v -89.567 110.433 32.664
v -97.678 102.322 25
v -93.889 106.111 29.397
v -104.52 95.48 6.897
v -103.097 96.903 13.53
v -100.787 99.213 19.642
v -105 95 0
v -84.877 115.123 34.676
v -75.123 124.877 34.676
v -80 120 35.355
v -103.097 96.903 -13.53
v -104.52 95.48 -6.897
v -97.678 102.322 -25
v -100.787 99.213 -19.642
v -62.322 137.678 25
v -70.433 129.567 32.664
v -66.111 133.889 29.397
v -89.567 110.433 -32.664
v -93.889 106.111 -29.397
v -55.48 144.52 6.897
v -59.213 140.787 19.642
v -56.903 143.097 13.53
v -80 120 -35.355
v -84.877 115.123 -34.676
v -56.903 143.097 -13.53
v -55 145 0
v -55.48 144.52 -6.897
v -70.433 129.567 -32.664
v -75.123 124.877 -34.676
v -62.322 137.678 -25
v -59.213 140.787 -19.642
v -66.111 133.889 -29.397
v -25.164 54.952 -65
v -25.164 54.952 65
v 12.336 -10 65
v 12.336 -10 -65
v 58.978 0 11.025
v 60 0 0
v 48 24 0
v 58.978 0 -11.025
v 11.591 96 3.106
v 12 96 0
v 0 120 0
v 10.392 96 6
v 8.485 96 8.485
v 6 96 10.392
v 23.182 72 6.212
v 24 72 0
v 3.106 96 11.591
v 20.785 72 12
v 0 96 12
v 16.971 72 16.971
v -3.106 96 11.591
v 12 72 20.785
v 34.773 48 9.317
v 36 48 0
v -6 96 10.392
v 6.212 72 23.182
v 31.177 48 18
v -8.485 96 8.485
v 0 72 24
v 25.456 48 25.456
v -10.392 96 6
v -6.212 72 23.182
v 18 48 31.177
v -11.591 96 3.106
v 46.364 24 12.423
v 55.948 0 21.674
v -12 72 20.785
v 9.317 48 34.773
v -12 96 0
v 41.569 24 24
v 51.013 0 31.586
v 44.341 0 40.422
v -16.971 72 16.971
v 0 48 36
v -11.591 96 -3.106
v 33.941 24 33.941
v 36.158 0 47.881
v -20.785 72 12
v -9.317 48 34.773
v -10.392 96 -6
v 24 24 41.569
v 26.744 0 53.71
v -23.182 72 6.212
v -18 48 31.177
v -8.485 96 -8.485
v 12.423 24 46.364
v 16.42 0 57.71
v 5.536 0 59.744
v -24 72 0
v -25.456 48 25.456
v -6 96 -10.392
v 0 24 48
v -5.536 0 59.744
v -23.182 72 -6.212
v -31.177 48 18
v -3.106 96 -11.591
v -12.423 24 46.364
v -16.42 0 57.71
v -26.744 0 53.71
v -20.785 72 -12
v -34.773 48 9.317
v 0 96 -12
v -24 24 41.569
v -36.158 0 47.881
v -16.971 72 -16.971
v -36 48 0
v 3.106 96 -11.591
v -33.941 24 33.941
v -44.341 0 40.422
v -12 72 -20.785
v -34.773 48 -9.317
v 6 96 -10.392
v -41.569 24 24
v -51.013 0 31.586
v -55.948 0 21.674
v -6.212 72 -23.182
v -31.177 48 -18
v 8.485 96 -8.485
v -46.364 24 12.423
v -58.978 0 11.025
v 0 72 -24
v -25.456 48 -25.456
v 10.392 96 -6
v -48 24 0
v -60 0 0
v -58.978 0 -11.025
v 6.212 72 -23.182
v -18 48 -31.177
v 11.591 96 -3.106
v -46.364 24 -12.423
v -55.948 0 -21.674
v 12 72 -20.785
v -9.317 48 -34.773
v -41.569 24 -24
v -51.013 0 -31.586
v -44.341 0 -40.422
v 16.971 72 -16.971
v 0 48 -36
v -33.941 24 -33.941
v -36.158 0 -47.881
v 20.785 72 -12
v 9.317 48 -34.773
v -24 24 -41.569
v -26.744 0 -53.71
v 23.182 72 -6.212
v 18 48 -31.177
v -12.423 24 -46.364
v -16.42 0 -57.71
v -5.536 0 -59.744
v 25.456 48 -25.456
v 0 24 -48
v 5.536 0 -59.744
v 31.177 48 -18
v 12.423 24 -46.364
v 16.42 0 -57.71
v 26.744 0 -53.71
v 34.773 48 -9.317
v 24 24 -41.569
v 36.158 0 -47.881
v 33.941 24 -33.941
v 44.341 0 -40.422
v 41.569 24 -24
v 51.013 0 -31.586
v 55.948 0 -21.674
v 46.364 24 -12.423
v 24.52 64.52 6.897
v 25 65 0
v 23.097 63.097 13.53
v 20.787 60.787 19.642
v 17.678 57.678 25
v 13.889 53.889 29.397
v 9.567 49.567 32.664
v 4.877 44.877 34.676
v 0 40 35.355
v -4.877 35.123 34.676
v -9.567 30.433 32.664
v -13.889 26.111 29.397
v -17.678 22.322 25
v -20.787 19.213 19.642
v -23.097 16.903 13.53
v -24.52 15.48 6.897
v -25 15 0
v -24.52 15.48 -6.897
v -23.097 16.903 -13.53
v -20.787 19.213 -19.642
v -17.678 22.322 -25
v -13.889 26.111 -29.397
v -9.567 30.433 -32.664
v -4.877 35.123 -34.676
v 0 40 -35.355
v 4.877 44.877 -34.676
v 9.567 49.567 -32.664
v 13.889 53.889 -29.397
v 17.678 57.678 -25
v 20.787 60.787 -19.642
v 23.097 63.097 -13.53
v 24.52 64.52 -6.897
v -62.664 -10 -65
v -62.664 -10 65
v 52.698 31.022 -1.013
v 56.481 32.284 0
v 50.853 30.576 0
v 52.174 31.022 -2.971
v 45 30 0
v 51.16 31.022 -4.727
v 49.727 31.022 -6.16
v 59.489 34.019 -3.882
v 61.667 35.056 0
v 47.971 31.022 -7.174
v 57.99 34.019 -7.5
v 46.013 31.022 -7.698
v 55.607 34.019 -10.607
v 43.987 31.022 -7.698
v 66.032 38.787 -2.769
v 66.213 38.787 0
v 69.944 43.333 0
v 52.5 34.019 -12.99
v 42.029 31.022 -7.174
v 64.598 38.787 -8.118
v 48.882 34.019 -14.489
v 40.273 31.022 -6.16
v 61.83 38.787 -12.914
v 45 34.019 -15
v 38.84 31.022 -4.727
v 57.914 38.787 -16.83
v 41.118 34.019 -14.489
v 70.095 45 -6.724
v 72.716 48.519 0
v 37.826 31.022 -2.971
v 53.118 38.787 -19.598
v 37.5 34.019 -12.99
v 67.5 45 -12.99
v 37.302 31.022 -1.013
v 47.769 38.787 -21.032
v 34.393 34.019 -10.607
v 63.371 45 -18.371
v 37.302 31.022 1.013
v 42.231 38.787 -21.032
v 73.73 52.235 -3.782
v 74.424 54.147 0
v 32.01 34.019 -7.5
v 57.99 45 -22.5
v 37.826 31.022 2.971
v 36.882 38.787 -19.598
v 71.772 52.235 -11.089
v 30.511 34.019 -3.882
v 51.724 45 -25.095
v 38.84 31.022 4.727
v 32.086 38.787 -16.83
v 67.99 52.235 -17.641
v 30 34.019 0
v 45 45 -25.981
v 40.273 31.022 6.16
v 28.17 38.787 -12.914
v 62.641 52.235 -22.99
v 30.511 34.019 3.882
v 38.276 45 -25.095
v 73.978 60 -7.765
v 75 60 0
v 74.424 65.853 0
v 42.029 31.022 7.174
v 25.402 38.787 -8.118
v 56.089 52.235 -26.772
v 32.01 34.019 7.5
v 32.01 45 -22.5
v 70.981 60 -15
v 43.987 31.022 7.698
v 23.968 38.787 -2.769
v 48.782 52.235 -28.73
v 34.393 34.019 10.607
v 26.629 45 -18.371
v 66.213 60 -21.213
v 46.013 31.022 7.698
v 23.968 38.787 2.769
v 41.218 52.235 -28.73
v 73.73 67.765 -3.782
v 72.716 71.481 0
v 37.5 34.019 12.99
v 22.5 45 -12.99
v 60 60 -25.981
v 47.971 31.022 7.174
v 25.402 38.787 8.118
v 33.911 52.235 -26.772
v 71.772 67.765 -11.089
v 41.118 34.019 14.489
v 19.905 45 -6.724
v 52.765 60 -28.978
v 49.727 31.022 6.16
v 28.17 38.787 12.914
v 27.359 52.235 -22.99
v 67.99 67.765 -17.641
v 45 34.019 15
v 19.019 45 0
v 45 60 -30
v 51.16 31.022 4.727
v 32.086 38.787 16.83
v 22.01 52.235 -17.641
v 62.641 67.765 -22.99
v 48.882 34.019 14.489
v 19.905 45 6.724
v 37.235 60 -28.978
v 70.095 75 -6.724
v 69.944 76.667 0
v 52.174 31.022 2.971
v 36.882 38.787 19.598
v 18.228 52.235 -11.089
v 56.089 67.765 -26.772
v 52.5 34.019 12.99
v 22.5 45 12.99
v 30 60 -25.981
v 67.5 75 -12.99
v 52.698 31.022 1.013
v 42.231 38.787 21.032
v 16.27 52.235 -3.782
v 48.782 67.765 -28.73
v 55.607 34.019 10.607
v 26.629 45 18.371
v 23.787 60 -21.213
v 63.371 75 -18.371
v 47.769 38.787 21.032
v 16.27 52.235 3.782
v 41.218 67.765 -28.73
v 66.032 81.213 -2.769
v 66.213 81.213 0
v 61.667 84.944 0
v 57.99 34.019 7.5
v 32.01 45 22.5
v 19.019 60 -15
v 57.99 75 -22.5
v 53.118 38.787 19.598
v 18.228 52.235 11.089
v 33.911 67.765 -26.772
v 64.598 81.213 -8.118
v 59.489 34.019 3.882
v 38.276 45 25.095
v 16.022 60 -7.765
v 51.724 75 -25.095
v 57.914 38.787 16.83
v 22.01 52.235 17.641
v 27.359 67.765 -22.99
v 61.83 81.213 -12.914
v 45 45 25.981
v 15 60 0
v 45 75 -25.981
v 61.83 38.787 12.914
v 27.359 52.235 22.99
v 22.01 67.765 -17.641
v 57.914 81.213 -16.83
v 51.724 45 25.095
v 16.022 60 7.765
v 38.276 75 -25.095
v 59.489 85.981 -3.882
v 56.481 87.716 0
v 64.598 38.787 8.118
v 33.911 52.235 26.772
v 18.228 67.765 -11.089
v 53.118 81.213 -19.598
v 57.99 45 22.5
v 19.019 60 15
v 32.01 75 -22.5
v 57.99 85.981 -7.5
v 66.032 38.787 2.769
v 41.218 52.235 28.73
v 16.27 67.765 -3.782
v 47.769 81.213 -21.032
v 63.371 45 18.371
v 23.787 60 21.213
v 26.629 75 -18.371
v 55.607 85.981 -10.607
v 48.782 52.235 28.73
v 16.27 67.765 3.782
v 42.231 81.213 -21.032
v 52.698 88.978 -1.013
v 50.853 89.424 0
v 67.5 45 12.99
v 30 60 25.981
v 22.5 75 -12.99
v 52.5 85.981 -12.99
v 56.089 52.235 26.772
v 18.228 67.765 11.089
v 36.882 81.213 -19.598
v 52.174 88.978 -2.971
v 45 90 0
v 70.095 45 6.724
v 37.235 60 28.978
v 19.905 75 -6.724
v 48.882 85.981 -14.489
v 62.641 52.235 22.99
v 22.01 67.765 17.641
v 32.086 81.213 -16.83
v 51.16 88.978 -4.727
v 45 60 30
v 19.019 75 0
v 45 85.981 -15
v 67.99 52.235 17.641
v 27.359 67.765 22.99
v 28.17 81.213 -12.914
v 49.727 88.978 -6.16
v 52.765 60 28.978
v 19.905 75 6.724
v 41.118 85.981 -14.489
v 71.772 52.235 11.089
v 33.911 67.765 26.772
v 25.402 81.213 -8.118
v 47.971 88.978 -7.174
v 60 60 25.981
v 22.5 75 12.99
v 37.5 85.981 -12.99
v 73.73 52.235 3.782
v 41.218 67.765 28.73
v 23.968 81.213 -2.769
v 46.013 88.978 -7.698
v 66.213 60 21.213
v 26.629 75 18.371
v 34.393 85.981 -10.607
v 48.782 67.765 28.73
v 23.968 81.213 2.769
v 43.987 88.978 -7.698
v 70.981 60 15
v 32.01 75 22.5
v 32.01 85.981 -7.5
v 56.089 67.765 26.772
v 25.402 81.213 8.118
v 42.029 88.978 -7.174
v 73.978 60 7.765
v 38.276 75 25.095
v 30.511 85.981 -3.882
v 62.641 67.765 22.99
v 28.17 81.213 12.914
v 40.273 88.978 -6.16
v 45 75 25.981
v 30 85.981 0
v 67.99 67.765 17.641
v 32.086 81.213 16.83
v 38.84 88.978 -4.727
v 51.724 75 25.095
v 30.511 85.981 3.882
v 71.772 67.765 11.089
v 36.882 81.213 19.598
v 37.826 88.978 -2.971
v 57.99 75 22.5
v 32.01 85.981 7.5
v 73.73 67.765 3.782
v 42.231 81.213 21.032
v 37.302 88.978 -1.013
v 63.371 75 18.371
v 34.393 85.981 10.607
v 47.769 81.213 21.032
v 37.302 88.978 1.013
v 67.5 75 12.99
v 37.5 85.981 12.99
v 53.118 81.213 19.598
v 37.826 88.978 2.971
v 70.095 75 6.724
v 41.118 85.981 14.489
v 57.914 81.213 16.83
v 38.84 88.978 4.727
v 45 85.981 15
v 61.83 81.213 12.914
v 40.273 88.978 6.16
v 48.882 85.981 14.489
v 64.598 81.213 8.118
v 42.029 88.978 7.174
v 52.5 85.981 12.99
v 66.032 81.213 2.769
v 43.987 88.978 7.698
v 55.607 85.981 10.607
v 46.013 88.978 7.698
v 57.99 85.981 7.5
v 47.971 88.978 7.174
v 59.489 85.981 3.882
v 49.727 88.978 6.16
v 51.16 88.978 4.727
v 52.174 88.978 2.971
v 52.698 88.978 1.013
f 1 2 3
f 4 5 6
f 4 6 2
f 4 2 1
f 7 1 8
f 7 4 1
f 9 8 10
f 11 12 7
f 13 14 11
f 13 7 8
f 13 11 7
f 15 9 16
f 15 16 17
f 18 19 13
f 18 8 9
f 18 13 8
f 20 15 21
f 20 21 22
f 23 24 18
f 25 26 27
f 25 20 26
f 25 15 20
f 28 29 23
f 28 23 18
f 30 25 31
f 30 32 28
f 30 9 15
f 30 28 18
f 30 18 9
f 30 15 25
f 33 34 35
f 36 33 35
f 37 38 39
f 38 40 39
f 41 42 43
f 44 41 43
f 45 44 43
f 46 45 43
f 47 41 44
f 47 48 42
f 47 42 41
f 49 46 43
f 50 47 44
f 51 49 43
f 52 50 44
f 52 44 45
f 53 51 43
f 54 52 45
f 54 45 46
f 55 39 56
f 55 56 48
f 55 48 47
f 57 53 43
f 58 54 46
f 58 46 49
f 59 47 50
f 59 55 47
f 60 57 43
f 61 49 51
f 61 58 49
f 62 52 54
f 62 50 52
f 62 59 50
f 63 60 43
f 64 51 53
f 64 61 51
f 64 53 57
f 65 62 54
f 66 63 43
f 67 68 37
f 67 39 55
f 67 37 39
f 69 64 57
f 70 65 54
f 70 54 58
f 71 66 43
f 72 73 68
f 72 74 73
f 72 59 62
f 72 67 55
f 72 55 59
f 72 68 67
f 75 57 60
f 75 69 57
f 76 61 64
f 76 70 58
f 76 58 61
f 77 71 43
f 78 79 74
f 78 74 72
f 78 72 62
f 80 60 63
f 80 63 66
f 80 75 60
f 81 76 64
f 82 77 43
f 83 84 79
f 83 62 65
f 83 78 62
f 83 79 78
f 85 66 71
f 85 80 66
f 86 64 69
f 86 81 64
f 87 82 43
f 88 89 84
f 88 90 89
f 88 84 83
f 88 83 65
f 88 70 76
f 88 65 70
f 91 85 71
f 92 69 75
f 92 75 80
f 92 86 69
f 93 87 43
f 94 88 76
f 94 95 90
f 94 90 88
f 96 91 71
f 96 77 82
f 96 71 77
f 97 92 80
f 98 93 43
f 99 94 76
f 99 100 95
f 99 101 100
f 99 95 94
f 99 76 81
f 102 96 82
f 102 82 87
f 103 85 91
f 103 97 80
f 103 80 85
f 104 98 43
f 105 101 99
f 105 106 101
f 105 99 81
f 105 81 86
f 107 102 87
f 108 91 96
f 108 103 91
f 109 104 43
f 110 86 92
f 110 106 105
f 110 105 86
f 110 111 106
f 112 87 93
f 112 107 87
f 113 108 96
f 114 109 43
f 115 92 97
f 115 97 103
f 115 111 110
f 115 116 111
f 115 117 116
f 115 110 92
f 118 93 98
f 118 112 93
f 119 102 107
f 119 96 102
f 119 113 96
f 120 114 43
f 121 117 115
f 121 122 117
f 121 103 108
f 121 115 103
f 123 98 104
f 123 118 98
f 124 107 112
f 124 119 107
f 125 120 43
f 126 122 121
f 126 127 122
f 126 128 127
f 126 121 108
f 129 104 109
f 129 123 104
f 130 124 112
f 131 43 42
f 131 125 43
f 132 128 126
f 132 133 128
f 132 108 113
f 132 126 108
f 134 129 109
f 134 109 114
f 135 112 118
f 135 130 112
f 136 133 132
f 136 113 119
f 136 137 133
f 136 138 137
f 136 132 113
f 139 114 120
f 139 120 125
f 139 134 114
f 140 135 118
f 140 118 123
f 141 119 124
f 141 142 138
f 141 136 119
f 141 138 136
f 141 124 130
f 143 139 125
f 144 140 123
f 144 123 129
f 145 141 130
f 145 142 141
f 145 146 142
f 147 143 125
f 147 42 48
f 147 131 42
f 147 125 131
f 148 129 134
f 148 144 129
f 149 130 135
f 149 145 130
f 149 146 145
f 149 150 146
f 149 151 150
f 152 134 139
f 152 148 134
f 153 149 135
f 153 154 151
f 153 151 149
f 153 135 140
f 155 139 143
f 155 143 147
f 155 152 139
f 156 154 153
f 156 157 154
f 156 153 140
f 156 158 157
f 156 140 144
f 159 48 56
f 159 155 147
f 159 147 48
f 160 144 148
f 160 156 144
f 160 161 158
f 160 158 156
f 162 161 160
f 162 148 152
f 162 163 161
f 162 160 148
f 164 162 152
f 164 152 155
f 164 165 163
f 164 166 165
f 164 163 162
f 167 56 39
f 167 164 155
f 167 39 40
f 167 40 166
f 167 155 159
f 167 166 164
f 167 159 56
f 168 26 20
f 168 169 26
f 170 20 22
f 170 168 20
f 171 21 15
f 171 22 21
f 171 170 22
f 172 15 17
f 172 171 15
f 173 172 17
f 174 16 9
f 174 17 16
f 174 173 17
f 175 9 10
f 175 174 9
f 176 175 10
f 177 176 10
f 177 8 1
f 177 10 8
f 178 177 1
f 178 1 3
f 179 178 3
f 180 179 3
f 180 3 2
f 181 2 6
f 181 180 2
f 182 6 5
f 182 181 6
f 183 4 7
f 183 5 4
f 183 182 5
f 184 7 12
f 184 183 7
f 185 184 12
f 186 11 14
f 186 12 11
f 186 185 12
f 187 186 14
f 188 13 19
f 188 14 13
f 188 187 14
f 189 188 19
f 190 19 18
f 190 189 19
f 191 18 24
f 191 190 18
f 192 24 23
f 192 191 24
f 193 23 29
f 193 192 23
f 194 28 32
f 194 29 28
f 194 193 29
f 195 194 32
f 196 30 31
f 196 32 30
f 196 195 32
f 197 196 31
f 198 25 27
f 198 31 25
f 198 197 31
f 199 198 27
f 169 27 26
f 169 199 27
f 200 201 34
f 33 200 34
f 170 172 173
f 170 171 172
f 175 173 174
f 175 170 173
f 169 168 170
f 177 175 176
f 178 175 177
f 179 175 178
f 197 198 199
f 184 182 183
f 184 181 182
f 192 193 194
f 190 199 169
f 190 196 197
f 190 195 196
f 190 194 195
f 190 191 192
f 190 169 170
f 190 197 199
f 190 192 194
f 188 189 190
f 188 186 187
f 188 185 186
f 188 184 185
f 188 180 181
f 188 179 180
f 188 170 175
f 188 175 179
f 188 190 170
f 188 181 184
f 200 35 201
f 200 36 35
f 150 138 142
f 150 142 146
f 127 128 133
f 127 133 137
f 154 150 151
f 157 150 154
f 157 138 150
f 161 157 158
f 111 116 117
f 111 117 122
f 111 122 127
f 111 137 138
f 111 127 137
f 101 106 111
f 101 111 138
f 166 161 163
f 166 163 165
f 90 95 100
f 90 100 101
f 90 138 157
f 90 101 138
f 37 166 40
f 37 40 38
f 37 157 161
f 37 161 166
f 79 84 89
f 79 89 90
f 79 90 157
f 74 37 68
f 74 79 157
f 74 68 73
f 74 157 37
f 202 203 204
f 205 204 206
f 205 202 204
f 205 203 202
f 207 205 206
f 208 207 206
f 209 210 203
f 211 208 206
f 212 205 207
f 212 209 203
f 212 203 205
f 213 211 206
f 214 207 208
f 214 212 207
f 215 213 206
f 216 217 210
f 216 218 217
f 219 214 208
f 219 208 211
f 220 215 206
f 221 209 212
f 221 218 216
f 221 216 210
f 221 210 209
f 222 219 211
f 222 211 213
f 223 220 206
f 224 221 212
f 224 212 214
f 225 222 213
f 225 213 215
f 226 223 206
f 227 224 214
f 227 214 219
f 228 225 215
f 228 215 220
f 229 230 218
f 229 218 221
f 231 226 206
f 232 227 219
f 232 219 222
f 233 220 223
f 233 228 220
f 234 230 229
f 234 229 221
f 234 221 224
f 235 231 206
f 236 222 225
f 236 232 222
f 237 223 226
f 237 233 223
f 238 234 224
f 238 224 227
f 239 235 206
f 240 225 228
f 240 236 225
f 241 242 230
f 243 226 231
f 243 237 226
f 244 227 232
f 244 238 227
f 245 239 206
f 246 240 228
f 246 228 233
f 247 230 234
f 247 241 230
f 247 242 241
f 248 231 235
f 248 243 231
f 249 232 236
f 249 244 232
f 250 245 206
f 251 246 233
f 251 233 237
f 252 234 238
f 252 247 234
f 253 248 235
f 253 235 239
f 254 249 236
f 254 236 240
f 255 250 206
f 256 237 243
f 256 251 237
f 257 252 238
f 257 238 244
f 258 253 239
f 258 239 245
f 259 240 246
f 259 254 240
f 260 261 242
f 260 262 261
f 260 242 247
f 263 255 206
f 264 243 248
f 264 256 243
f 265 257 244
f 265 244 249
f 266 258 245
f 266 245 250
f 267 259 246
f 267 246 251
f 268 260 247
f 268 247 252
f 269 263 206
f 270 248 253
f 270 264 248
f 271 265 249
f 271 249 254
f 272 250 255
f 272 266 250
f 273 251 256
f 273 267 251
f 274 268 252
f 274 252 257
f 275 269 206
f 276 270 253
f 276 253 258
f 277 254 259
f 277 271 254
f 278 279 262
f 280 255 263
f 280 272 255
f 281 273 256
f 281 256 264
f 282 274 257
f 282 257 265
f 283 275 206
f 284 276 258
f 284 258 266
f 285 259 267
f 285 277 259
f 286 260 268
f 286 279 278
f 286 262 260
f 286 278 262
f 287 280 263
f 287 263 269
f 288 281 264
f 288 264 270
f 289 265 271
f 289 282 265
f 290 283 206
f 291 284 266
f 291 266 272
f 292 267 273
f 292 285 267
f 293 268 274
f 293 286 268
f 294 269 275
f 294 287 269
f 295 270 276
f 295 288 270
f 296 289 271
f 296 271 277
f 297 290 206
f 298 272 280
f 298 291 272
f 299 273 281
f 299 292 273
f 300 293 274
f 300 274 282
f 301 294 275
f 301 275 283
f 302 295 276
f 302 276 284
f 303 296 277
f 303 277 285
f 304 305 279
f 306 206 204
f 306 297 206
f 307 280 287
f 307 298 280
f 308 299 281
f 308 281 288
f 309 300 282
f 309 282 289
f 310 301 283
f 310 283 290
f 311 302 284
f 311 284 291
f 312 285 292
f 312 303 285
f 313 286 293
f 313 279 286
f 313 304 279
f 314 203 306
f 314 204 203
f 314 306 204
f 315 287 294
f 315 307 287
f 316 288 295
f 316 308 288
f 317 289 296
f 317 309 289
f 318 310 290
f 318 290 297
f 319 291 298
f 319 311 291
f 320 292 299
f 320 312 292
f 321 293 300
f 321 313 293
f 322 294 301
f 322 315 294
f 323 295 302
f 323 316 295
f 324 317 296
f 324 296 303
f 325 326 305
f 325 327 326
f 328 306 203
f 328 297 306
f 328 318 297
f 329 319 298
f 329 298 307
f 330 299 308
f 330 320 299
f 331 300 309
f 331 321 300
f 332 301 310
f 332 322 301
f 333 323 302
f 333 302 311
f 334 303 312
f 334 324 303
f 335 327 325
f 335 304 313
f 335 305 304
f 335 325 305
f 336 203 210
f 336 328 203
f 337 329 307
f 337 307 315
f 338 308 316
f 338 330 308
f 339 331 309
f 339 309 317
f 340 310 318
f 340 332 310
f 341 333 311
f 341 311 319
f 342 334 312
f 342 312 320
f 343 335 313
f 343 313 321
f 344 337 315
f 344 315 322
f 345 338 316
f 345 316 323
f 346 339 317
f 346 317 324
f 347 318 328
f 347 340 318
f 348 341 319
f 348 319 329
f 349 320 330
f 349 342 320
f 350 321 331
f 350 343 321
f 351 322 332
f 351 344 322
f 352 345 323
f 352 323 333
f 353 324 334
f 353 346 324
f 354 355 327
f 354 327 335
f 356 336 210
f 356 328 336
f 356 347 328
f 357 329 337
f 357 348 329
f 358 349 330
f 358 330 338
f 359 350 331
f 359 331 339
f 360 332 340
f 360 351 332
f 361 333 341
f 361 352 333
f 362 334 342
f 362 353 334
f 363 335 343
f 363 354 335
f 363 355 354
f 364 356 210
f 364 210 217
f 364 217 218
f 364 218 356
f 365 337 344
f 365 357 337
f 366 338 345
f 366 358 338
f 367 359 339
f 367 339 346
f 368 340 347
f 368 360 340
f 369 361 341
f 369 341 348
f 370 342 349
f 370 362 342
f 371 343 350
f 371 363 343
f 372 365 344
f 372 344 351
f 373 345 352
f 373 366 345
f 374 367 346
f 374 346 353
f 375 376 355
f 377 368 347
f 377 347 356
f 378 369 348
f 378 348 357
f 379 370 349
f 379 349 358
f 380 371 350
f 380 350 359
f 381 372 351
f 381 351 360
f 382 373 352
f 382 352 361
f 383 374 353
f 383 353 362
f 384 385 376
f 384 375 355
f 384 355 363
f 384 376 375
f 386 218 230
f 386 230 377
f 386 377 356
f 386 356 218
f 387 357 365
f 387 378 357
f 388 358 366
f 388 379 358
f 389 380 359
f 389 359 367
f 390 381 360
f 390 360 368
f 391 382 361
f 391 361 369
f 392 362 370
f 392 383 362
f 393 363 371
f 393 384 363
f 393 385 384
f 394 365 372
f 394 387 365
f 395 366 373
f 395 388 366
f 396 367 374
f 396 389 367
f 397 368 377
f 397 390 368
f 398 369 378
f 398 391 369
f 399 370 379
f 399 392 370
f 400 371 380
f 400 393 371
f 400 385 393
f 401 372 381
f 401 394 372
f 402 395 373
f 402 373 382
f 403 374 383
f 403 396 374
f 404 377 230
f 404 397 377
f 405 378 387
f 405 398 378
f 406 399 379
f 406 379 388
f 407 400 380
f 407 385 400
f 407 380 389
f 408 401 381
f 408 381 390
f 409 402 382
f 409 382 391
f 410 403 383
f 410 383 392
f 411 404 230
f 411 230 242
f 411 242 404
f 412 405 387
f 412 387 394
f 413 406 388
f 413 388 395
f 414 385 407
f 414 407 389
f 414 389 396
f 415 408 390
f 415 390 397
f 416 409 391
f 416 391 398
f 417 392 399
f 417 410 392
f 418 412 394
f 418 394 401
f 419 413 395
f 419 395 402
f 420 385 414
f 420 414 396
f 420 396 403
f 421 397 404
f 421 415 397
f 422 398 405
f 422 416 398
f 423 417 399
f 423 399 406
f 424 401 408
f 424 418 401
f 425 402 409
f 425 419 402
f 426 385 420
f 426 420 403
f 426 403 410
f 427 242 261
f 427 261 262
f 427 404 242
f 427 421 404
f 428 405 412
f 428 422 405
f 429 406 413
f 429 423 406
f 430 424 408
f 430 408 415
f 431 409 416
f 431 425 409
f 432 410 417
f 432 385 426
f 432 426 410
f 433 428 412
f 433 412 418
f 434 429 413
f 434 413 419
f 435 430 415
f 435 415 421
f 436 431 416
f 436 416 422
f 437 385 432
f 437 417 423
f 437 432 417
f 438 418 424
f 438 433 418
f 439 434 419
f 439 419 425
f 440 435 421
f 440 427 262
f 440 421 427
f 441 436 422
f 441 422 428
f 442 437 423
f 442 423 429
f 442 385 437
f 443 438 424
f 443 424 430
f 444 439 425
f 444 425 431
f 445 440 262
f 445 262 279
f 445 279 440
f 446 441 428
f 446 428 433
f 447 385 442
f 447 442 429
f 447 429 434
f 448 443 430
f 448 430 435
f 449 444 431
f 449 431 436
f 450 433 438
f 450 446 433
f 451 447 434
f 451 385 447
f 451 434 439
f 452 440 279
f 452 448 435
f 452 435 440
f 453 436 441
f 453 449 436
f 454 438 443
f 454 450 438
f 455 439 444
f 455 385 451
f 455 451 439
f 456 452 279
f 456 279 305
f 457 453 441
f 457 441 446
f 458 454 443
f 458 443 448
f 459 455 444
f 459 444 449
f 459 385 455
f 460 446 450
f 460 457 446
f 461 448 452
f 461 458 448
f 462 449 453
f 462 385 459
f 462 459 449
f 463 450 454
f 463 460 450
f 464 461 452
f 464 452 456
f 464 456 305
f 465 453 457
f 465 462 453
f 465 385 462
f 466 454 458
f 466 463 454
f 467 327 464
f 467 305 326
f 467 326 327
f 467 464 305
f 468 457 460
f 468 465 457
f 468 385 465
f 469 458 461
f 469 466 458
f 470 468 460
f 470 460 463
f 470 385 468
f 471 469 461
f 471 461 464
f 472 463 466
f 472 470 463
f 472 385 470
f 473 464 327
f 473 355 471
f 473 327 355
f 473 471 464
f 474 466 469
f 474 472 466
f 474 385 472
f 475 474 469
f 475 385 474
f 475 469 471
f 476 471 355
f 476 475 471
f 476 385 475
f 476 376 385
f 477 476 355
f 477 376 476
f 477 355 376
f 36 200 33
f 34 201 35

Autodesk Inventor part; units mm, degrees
ref_plane "YZ Plane" through (0, 0, 0) normal (1, 0, 0) x (0, 1, 0)
ref_plane "XZ Plane" through (0, 0, 0) normal (0, 1, 0) x (-1, 0, 0)
ref_plane "XY Plane" through (0, 0, 0) normal (0, 0, 1) x (1, 0, 0)
sketch "Эскиз1" plane through (0, 0, 0) normal (0, 0, 1) x (1, 0, 0)
  line L0 (0, 0) -> (60, 0)
  line L1 (60, 0) -> (0, 120)
  line L2 (0, 120) -> (0, 0)
  dimension "d0" = 60
  dimension "d1" = 120
revolve "Вращение1" add sketch "Эскиз1" angle 360 about axis through (0, 120, 0) along (0, -1, 0)
sketch "Эскиз2" plane through (0, 0, 0) normal (0, 0, 1) x (1, 0, 0)
  line L0 (-60, 0) -> (60, 0) projected
  line L1 (0, 120) -> (60, 0) projected
  line L2 (45, 90) -> (45, 30)
  arc A0 (45, 30) -> (45, 90) centre (45, 60) ccw
  point P0 (0, 0)
revolve "Вращение2" add sketch "Эскиз2" angle 360 about axis through (45, 90, 0) along (0, -1, 0) separate body
sketch "Эскиз5" plane through (0, 0, 0) normal (0, 0, 1) x (1, 0, 0)
  line L0 (-25.1641, 54.9519) -> (12.3359, -10)
  line L1 (12.3359, -10) -> (-62.6641, -10)
  line L2 (-62.6641, -10) -> (-25.1641, 54.9519)
  line L3 (-60, 0) -> (60, 0) projected
  point P0 (0, 0)
  dimension "d10" = 75
  dimension "d11" = 60
  dimension "d12" = 60
  dimension "d19" = 10
extrude "Выдавливание1" add sketch "Эскиз5" along normal mid plane 130 separate body
sketch "Эскиз6" plane through (0, 0, 0) normal (0, 0, 1) x (1, 0, 0)
  line L0 (0, 0) -> (0, 40)
  line L1 (0, 40) -> (-80, 120)
  line L2 (-80, 120) -> (-55, 145)
  line L3 (-55, 145) -> (25, 65)
  line L4 (25, 65) -> (0, 40)
  dimension "d22" = 40
  dimension "d23" = 25
  dimension "d25" = 80
  dimension "d26" = 135
revolve "Вращение3" add sketch "Эскиз6" angle 360 about axis through (0, 40, 0) along (-0.7071, 0.7071, 0) separate body
properties part number "Лаба3"
